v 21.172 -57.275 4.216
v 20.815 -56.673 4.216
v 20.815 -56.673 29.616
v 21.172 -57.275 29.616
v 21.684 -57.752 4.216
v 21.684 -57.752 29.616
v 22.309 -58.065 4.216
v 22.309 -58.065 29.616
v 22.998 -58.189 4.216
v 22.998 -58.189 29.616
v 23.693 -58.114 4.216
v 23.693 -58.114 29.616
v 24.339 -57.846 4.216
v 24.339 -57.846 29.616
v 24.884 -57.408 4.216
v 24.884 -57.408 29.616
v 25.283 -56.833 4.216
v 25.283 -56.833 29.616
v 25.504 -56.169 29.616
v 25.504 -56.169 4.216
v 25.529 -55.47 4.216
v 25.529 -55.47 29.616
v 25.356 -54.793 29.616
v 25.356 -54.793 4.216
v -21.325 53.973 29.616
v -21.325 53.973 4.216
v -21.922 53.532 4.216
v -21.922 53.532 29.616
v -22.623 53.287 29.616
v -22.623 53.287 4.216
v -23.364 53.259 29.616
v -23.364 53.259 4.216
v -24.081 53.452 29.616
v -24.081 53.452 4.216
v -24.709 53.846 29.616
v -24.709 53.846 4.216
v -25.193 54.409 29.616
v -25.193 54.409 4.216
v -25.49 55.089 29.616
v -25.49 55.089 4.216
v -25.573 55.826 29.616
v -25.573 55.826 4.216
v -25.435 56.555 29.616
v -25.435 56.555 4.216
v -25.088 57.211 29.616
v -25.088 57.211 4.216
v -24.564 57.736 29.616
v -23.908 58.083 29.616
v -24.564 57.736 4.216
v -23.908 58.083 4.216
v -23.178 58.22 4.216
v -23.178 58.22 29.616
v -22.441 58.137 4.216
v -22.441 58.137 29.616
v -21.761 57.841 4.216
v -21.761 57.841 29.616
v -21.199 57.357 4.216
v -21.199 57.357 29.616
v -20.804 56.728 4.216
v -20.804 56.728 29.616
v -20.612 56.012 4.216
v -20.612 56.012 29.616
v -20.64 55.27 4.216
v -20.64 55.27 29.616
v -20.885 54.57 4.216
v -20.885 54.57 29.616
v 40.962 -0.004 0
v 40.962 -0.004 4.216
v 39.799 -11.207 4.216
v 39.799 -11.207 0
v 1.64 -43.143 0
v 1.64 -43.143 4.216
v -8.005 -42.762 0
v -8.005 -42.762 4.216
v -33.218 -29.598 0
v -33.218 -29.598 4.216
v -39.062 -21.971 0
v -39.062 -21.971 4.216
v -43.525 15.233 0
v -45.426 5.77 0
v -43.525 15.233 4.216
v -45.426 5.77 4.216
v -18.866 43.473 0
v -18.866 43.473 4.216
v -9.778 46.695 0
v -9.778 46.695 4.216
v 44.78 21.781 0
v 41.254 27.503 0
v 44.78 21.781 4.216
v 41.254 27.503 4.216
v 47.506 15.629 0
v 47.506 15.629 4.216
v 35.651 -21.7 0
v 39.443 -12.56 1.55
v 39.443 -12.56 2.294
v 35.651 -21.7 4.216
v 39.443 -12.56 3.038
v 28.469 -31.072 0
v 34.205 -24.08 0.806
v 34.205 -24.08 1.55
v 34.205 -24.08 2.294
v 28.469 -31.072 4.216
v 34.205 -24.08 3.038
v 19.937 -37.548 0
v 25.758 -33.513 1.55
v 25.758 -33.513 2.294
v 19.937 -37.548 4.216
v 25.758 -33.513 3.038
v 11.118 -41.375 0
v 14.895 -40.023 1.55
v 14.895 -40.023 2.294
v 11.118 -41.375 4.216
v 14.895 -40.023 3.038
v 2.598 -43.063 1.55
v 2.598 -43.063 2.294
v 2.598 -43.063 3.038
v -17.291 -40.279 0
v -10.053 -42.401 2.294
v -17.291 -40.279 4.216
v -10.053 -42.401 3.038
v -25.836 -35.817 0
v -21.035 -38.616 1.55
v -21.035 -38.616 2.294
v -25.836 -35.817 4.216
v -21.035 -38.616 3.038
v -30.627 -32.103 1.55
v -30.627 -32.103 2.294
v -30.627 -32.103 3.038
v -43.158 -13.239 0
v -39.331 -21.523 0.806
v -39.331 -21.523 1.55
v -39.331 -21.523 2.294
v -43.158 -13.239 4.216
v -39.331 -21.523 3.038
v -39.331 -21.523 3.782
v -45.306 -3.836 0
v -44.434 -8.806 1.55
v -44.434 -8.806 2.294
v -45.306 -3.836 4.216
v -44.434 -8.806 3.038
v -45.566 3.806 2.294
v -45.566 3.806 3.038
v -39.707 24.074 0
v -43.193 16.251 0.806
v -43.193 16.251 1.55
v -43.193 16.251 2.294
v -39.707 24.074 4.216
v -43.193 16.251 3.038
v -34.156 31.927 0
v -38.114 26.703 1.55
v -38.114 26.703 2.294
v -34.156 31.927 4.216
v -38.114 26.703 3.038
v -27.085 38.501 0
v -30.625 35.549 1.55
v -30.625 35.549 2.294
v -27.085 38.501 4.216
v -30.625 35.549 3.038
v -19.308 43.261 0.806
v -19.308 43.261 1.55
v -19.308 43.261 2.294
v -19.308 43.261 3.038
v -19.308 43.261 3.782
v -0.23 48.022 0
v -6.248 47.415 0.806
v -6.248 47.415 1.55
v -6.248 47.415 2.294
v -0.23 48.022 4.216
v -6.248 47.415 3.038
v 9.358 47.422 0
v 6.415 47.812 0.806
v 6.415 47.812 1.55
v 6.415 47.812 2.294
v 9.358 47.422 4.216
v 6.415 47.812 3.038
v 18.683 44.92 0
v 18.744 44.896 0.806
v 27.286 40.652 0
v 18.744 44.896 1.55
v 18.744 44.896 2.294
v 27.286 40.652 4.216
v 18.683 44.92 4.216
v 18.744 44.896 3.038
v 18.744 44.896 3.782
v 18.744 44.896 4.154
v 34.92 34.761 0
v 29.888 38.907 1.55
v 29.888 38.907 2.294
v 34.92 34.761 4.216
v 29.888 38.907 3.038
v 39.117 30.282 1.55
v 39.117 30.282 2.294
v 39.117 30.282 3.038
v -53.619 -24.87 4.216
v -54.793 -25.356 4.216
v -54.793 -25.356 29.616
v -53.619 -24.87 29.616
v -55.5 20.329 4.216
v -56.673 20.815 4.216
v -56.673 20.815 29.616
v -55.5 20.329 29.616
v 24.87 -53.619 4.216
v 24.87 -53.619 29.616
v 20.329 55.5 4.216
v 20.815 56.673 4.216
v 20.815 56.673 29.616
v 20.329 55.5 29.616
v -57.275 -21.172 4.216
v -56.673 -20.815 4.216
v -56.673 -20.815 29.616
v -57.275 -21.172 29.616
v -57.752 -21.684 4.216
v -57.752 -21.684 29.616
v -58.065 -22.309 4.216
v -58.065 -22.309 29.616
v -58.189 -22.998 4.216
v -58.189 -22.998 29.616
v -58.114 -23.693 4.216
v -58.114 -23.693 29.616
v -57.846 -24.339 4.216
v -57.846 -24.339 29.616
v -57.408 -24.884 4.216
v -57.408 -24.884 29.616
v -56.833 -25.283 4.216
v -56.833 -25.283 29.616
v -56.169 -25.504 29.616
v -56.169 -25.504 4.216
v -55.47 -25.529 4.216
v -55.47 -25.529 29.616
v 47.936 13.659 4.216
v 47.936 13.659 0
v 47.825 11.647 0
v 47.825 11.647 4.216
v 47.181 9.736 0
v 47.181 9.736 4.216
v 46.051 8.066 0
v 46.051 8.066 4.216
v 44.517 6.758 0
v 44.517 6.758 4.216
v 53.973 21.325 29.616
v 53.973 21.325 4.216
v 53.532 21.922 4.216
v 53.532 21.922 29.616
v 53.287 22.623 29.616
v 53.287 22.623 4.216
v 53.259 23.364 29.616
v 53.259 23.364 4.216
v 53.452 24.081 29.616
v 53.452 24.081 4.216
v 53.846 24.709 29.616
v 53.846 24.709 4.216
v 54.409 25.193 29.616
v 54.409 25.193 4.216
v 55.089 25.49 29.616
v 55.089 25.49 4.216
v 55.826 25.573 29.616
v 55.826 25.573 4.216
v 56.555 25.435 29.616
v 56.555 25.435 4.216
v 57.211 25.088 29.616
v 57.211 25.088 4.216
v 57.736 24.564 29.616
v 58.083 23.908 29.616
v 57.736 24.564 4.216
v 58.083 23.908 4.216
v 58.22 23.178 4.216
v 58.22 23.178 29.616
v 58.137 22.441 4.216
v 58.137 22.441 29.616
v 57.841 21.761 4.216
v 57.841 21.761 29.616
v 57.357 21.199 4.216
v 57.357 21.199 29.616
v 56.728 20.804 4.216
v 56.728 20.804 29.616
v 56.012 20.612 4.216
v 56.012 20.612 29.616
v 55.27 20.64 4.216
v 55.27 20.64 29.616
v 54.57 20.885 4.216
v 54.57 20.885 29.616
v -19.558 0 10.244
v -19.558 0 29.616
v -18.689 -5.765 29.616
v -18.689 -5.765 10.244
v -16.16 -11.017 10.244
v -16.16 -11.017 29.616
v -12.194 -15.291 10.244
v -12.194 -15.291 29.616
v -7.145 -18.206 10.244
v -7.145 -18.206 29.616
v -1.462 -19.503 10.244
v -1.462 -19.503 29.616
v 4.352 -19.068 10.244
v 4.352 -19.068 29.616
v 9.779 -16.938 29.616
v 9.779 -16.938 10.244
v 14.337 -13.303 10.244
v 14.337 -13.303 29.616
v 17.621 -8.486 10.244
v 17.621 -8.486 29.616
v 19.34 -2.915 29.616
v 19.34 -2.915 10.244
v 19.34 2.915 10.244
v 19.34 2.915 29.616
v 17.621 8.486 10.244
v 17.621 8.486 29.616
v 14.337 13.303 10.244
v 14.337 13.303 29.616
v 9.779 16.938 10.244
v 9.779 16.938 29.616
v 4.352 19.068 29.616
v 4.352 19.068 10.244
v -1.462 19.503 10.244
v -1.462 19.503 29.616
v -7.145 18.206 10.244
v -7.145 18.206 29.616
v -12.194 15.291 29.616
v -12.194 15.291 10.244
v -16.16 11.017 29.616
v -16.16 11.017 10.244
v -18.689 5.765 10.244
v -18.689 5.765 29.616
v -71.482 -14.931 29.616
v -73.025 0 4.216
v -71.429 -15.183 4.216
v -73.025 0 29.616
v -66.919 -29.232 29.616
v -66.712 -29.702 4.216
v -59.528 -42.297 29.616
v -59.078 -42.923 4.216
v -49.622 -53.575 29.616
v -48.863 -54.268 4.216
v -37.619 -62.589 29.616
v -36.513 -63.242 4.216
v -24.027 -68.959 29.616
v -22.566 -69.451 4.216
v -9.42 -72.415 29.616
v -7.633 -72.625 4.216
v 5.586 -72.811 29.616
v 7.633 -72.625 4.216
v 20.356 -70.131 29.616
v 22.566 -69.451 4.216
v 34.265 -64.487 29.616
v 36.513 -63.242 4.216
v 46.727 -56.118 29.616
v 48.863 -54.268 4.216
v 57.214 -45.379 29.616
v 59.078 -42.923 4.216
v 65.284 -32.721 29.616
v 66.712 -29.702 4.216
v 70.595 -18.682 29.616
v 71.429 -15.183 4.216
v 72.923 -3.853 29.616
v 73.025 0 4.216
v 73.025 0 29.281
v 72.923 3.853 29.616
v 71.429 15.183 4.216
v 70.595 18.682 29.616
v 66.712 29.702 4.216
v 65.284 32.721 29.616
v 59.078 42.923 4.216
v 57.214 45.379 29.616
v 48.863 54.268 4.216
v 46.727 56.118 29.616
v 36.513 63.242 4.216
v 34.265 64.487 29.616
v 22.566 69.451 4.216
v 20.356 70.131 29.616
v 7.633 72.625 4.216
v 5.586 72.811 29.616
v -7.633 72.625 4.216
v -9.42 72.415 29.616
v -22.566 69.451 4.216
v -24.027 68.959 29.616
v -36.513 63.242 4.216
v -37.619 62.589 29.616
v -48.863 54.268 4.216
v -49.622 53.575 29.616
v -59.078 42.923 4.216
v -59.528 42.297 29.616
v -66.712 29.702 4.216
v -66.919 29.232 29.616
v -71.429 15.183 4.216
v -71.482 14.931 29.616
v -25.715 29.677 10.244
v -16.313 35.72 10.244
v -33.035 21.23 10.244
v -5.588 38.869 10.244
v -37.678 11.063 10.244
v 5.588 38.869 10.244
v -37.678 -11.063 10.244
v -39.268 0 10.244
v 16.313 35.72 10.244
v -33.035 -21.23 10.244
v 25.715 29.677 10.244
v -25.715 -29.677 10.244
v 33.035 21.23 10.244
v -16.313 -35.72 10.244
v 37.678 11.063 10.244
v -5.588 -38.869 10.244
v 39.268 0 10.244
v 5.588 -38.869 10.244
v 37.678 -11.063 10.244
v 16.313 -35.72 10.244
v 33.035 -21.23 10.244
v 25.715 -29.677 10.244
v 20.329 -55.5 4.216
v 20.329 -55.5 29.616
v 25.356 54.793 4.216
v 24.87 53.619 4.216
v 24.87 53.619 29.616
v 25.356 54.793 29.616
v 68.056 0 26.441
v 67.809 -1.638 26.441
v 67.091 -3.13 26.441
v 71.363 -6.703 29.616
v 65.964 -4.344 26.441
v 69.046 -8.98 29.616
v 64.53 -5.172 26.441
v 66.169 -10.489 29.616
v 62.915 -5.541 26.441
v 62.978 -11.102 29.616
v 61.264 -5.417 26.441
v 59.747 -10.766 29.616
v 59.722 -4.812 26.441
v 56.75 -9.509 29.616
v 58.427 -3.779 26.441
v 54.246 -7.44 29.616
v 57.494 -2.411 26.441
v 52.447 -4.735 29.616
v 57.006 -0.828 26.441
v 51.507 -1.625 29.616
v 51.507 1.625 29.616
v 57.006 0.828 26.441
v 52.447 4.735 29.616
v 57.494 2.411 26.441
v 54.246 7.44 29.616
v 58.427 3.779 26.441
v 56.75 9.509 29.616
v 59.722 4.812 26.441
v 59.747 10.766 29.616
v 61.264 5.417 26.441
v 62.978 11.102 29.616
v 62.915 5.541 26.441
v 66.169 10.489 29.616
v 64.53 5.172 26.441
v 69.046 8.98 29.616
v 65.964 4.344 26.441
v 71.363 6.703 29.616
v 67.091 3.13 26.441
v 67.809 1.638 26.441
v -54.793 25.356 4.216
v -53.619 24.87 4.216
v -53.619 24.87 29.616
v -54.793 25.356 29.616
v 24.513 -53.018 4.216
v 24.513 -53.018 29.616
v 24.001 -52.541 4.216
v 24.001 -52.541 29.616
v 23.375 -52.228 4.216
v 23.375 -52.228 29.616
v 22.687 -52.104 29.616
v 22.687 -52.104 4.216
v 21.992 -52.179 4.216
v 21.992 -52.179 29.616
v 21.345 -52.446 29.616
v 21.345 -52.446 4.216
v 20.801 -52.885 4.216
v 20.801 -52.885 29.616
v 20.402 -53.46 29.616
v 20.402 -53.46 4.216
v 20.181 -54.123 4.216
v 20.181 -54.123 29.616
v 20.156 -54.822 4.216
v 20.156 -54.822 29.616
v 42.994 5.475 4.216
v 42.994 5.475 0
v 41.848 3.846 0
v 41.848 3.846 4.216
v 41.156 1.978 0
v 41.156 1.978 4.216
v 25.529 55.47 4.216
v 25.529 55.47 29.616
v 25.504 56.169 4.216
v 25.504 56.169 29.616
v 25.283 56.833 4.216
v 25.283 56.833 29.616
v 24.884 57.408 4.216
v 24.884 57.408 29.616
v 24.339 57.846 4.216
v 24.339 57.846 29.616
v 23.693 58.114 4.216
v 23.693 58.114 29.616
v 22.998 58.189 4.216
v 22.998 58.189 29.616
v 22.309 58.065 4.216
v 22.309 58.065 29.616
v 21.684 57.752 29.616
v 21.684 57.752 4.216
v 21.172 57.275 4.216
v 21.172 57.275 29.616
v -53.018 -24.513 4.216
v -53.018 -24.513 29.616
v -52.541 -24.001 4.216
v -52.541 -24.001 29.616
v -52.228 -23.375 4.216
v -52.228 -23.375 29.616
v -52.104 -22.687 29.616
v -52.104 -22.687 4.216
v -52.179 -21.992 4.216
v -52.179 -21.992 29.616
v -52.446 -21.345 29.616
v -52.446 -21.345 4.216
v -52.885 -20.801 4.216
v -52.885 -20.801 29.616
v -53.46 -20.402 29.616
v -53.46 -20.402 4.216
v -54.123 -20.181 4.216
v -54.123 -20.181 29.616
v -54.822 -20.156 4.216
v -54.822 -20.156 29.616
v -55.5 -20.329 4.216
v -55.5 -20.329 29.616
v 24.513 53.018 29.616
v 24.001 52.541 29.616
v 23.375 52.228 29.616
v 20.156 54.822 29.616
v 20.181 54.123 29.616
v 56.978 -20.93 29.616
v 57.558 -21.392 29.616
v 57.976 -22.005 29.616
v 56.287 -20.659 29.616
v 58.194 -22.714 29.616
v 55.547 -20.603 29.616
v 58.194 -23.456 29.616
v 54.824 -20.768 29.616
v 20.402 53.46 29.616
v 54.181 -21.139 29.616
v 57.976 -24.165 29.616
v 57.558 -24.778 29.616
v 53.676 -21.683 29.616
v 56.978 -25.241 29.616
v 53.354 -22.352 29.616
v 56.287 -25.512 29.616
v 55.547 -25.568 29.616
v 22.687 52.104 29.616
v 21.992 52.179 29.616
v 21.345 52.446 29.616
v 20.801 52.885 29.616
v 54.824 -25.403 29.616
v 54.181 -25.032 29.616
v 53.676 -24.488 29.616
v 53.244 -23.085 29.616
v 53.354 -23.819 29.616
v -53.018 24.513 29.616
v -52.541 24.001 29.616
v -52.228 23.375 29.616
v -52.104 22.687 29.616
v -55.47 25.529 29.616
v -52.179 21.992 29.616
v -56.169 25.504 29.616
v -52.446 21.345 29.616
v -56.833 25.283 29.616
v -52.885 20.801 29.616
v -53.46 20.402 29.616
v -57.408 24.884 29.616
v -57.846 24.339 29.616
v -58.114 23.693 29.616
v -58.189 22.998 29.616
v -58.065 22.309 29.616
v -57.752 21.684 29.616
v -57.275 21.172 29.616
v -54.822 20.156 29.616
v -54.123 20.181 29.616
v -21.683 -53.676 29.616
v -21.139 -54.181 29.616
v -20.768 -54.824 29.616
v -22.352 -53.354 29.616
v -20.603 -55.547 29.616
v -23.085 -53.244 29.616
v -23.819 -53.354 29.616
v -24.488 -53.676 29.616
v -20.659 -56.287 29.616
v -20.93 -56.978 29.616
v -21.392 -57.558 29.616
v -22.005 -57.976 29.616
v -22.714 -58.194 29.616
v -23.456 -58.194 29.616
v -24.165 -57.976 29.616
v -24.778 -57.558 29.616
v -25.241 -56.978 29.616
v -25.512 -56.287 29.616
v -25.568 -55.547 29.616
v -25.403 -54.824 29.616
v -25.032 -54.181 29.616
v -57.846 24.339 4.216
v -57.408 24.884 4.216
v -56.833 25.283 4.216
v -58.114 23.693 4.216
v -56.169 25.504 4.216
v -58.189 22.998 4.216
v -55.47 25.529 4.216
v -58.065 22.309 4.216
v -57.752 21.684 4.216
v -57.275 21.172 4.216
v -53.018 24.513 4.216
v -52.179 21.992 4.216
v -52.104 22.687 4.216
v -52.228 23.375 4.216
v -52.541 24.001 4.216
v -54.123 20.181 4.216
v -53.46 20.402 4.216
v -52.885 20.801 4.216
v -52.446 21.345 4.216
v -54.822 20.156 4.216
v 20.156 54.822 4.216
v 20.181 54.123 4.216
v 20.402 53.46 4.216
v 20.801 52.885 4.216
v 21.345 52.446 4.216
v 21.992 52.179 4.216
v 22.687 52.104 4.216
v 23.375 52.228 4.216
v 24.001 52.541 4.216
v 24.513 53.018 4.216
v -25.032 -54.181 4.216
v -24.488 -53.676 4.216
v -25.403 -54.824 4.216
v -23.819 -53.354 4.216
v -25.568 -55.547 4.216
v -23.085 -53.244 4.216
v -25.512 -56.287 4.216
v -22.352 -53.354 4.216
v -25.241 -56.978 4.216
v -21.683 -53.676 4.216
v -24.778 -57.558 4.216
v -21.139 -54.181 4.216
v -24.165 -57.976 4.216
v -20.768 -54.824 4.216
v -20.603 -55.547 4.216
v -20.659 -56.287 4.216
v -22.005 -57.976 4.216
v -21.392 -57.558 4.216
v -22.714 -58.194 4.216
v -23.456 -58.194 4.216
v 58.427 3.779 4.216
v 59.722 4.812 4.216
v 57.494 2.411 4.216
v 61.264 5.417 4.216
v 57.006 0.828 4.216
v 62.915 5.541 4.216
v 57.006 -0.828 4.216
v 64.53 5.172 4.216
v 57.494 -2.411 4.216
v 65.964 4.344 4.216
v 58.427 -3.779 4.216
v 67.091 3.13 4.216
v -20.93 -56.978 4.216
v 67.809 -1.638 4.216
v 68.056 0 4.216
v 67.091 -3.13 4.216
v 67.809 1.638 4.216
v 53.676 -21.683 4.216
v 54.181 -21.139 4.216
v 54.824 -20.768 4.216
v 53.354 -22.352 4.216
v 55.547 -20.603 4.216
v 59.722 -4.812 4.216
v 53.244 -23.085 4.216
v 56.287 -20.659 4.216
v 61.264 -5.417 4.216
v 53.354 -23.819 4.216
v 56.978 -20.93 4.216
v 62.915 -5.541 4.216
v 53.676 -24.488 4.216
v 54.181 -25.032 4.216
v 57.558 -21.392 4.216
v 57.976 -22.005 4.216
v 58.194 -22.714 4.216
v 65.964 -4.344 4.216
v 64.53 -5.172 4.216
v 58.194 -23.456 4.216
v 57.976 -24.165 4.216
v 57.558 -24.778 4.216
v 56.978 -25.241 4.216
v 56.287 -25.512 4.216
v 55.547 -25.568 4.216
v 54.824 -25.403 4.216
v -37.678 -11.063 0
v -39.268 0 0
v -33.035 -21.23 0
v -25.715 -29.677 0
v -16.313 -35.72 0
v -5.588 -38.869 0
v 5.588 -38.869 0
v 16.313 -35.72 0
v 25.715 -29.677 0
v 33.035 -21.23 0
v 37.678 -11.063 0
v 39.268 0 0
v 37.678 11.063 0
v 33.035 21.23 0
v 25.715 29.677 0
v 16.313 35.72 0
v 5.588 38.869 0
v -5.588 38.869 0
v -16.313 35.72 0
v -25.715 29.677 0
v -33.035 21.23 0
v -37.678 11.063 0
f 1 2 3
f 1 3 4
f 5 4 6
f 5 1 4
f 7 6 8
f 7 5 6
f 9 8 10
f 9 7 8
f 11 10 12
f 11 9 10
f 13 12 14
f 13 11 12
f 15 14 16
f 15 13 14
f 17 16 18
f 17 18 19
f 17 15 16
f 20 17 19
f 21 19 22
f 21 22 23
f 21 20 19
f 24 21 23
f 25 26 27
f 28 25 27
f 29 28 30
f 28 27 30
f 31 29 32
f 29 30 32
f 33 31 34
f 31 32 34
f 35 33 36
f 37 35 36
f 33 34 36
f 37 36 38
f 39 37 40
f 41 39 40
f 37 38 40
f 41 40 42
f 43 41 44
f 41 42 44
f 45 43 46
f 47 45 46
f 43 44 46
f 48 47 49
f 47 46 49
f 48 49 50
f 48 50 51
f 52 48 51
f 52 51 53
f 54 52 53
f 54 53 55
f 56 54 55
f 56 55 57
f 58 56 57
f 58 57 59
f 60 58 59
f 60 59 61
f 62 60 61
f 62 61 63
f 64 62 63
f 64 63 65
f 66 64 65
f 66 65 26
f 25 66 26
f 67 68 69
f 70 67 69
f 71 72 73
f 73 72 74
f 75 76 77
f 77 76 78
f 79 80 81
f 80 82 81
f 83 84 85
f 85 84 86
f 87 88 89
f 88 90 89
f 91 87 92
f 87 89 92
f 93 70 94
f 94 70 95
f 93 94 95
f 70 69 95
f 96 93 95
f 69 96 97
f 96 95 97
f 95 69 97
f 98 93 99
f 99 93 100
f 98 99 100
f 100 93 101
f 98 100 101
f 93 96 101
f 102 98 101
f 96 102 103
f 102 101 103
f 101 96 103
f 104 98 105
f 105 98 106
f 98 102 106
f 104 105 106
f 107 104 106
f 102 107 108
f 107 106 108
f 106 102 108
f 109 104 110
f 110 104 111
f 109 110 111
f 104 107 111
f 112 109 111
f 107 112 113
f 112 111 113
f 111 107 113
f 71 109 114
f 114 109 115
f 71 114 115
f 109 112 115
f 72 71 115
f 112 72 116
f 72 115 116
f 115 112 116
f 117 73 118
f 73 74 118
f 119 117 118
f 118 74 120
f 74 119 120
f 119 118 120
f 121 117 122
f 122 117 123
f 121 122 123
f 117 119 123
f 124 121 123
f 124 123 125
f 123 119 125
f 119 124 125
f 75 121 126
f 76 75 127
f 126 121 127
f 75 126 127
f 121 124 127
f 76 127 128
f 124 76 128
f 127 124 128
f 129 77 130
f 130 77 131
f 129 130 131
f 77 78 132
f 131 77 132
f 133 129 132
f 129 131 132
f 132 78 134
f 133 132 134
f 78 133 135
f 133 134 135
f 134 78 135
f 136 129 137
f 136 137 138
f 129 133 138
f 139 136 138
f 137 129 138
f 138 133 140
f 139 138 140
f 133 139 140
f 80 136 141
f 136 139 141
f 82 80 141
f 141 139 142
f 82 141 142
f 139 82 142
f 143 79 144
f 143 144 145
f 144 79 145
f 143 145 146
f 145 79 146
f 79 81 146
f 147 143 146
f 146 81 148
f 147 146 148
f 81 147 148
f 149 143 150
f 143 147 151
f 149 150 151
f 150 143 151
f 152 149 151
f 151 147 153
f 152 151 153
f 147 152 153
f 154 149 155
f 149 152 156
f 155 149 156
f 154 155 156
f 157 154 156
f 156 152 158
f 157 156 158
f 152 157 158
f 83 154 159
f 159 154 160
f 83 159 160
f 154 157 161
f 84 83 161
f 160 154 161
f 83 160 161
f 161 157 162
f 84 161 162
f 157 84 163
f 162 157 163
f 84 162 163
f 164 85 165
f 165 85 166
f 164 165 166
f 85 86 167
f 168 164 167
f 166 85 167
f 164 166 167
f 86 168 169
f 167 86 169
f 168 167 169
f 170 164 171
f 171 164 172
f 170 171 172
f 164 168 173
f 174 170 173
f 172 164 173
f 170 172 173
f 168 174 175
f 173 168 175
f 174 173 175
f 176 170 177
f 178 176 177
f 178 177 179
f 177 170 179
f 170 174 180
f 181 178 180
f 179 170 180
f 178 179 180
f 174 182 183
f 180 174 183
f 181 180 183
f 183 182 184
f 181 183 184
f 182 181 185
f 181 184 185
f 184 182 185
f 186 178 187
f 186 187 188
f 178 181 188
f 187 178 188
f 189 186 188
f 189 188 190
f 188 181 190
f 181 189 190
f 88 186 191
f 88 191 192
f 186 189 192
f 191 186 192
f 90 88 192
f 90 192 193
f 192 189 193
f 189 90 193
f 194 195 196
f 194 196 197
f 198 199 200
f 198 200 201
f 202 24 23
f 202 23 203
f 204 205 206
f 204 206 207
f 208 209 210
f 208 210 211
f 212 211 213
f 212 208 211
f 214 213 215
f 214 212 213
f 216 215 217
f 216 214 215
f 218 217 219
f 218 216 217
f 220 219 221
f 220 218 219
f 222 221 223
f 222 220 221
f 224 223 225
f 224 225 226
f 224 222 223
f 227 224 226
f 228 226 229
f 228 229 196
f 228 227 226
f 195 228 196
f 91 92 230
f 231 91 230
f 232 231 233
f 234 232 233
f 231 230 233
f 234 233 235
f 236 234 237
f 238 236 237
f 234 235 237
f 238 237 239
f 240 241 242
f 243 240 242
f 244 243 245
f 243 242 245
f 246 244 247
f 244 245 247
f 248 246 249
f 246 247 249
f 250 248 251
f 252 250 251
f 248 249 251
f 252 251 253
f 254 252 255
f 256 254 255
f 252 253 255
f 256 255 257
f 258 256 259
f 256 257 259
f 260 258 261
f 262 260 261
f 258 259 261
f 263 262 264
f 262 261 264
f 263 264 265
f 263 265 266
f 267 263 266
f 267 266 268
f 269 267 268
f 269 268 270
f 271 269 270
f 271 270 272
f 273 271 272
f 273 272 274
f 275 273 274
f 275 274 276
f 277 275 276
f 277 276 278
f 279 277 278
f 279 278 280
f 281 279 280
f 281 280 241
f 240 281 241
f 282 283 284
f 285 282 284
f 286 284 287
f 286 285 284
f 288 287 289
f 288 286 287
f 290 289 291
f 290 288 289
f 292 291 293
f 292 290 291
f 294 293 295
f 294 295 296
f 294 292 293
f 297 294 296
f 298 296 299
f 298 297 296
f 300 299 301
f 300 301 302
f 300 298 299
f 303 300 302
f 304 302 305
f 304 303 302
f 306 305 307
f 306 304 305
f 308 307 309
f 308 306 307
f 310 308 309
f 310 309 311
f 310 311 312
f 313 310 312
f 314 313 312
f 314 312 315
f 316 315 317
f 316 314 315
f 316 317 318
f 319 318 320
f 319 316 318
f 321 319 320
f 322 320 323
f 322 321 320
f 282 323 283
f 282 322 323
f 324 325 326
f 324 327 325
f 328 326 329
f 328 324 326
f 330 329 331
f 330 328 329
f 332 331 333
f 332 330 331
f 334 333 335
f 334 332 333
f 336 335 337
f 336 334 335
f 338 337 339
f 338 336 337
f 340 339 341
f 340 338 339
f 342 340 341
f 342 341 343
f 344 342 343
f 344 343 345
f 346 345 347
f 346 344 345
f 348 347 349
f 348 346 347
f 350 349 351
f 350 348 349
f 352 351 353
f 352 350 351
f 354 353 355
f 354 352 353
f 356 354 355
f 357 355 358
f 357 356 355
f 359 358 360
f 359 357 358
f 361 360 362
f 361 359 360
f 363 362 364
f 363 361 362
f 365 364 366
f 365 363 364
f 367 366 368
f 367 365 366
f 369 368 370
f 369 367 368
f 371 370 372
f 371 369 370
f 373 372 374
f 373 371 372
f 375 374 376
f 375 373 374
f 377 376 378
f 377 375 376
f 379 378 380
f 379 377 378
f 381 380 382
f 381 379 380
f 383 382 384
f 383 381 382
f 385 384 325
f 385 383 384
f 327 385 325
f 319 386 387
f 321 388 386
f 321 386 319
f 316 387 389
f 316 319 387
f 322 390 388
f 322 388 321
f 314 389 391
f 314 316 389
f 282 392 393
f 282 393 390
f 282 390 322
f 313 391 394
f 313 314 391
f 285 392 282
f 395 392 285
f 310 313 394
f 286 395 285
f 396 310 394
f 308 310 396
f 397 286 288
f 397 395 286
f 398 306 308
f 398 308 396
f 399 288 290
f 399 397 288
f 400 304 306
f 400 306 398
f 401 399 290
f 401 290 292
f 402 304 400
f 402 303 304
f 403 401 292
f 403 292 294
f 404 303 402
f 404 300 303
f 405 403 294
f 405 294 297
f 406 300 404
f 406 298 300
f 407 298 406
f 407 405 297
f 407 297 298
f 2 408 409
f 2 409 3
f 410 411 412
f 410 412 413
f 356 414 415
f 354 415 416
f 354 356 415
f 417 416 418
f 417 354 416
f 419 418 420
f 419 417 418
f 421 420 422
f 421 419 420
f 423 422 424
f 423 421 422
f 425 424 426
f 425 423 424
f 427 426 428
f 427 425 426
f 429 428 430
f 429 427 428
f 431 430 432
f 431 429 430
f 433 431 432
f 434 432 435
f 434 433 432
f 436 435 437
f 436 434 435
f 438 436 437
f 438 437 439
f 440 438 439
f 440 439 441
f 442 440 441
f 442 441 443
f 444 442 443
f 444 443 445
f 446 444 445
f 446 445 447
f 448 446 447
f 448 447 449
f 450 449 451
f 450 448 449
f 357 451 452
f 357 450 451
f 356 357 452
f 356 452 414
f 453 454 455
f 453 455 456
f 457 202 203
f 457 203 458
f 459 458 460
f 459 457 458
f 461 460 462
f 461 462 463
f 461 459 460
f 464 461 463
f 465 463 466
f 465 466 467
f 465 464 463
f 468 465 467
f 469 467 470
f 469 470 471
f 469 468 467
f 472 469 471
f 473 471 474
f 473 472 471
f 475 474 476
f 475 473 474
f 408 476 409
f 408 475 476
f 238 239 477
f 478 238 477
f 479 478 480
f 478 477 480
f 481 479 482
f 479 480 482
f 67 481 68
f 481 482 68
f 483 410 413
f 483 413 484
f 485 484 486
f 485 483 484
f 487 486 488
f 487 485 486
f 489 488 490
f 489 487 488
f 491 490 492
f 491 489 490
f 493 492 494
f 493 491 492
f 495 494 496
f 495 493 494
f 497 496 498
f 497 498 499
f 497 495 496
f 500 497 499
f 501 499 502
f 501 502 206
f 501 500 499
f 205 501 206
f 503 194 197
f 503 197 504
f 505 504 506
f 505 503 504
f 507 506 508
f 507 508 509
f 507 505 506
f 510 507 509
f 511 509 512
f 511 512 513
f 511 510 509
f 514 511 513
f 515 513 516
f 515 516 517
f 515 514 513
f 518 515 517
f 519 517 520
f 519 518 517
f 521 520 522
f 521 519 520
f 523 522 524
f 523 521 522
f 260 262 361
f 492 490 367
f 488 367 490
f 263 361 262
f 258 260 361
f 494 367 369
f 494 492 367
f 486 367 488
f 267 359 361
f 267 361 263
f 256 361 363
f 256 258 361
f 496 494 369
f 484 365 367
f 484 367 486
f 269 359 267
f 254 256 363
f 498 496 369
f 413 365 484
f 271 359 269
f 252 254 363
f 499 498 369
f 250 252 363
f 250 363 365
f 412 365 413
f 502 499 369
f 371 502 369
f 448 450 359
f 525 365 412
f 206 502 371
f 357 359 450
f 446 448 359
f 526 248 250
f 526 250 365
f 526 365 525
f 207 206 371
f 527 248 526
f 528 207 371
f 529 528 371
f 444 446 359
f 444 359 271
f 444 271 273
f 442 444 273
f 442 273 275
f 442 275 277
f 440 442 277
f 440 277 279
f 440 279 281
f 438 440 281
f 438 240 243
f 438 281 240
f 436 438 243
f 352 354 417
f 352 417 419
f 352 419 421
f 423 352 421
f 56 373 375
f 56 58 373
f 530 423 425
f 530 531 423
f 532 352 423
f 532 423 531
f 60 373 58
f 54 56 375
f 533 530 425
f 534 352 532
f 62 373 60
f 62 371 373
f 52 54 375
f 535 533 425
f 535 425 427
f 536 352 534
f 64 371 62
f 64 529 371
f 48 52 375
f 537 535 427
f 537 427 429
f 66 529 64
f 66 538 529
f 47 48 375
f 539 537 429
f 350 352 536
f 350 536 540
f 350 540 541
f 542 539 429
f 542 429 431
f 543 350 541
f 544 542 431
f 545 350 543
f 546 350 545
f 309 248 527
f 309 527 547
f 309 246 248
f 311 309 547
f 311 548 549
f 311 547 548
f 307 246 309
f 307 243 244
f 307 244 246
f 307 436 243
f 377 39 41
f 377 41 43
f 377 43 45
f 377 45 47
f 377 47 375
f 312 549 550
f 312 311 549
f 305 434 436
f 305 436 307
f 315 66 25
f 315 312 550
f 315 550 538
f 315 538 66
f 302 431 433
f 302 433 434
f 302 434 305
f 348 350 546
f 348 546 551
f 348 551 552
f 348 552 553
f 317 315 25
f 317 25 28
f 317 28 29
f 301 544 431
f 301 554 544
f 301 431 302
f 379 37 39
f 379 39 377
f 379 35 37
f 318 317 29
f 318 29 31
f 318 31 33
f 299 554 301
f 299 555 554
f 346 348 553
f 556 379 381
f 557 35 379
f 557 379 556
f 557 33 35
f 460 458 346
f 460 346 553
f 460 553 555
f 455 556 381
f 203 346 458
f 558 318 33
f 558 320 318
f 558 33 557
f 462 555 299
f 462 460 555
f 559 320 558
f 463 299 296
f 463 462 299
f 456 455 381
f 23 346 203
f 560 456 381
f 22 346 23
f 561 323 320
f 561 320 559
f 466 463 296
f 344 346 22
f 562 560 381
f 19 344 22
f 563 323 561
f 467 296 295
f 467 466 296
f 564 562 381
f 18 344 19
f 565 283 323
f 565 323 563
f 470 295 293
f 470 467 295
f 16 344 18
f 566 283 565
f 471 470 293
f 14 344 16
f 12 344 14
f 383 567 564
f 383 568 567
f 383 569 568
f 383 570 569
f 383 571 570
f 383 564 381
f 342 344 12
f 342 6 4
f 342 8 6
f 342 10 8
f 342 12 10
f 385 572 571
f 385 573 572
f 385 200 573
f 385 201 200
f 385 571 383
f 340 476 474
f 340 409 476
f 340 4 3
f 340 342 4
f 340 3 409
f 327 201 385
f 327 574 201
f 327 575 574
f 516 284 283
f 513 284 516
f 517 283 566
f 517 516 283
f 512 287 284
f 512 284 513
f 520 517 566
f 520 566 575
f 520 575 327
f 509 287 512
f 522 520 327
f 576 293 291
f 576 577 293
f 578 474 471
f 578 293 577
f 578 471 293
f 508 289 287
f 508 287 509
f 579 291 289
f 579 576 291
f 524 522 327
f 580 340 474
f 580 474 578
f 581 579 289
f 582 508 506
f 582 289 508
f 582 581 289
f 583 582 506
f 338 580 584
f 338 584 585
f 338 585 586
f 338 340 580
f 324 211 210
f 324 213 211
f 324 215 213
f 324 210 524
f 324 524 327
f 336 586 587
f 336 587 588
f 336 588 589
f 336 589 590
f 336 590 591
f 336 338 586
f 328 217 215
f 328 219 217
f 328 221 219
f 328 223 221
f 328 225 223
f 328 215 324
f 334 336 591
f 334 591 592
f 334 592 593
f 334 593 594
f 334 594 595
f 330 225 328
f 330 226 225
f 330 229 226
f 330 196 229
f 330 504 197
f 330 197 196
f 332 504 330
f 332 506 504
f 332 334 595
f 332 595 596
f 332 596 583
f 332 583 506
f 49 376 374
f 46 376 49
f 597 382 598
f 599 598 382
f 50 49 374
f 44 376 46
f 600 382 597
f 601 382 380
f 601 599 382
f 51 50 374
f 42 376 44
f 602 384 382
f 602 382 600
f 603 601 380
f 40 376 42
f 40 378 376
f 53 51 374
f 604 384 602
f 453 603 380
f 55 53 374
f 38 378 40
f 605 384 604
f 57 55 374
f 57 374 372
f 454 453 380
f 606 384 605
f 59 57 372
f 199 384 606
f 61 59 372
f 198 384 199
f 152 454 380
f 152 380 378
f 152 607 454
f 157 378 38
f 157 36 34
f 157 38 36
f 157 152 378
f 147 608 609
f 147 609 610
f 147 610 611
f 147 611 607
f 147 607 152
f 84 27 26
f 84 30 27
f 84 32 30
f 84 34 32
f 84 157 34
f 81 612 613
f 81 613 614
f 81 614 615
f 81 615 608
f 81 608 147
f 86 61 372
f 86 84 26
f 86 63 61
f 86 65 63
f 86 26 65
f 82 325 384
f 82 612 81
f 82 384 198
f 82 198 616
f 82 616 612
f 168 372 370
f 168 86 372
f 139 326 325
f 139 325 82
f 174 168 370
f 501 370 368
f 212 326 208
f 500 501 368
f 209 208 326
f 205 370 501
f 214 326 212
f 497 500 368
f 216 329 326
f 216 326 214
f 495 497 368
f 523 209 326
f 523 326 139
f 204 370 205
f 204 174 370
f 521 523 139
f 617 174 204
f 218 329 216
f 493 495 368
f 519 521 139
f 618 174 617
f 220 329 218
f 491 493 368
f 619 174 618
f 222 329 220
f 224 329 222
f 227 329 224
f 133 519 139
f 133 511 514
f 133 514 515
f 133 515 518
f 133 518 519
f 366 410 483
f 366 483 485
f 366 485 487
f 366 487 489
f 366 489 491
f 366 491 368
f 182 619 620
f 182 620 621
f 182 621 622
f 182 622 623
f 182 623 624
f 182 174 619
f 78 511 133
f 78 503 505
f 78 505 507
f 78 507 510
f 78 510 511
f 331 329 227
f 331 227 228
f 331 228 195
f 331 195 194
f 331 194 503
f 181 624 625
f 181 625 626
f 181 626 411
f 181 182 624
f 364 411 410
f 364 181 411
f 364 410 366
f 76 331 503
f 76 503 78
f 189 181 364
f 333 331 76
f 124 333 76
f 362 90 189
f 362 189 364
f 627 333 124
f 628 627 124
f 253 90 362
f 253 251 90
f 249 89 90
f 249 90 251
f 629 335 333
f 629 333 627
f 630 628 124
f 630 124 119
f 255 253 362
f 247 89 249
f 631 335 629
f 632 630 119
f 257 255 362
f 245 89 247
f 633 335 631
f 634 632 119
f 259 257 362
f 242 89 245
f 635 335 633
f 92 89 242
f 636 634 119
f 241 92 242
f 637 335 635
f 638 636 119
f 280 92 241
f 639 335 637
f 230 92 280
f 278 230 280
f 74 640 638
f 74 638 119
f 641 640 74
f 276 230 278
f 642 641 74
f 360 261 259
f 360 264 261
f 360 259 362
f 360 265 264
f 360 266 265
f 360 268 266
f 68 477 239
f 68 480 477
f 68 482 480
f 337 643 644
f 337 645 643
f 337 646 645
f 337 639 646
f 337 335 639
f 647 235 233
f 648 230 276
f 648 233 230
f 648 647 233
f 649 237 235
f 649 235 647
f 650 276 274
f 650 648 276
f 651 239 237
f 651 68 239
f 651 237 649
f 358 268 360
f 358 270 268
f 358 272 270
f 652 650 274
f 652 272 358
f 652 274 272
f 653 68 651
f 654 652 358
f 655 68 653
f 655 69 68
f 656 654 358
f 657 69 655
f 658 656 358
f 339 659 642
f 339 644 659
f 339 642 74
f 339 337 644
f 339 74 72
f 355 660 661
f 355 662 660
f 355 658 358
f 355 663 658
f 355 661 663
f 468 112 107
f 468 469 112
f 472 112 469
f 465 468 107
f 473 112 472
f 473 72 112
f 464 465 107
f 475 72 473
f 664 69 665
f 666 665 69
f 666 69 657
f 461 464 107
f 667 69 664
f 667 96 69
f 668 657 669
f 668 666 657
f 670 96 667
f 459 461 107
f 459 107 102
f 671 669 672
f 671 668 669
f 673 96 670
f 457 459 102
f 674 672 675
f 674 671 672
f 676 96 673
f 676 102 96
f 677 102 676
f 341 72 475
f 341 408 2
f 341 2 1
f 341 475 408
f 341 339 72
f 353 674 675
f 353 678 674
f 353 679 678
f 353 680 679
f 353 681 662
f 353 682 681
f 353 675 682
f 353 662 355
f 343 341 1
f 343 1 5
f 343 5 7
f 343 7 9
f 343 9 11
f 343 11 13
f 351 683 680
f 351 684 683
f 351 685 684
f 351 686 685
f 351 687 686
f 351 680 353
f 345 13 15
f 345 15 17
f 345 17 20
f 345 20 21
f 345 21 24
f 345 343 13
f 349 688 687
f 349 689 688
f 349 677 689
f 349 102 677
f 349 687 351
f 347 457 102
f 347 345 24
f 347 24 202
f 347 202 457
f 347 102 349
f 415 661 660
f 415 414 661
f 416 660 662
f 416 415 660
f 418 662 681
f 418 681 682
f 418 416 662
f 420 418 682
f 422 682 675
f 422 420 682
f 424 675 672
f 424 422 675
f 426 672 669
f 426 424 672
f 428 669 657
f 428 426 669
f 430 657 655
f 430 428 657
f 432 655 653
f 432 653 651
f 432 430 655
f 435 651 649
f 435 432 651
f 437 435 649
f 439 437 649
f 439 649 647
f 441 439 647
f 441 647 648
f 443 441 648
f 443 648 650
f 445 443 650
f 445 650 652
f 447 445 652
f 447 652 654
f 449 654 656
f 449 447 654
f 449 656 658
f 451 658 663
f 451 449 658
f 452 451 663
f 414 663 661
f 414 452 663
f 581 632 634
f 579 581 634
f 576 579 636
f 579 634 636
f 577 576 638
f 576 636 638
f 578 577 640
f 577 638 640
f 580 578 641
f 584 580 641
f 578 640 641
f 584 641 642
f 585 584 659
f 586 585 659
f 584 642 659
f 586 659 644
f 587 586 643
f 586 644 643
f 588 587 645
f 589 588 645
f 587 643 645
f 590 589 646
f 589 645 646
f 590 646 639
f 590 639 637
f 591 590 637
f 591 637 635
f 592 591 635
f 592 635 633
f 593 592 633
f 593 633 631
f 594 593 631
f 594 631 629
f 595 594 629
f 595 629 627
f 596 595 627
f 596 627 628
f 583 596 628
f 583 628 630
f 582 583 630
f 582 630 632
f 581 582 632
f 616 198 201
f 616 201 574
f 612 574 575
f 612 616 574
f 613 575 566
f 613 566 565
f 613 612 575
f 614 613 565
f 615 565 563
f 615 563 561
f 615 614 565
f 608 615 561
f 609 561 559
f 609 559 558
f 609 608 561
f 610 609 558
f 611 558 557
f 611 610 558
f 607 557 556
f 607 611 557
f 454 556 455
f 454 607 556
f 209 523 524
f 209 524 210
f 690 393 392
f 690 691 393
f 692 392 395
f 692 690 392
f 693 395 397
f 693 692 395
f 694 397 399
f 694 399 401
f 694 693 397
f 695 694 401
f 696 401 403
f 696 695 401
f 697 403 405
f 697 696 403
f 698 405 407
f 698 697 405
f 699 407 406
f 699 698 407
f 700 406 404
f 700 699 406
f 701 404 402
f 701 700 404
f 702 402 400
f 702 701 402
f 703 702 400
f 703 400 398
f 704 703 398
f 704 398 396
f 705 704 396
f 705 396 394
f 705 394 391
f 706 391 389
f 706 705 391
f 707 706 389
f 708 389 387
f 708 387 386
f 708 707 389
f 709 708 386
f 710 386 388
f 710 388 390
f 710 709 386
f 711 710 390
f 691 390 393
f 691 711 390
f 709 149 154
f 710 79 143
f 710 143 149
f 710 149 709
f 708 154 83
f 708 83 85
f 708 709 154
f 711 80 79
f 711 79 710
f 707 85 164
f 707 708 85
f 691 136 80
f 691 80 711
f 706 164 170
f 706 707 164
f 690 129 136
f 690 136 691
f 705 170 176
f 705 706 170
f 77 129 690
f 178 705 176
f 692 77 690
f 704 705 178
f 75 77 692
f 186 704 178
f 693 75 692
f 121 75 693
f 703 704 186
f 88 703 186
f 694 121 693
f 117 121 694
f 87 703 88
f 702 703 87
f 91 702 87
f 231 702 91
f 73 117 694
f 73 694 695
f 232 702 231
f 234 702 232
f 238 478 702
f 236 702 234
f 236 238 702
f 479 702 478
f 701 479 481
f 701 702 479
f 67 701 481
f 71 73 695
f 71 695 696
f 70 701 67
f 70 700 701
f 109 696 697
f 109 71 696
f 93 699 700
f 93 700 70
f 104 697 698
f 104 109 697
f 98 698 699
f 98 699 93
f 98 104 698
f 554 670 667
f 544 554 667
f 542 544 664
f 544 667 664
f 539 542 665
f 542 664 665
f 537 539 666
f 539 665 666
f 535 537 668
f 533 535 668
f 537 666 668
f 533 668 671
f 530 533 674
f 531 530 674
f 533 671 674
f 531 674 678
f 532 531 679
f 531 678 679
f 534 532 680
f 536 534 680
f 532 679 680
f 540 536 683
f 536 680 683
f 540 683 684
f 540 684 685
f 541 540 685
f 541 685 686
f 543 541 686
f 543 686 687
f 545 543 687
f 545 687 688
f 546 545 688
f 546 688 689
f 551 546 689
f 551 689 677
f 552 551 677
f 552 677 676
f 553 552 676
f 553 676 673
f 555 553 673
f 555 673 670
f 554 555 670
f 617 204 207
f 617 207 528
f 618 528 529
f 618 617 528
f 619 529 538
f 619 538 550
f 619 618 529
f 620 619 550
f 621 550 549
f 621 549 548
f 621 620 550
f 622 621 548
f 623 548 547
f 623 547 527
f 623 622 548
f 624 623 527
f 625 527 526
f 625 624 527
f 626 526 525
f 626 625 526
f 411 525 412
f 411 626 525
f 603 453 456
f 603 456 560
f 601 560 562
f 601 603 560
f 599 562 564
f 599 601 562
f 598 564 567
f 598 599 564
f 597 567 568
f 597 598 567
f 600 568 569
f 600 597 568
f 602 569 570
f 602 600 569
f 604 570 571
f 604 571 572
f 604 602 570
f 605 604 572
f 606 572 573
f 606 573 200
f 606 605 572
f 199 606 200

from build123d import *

# Parameters (mm, degrees)
CUT_EXTRUDE1_START               = 4.2164
SKETCH18_R                       = 57.15
CUT_EXTRUDE1_DEPTH               = 4.2164
F_10_CLEARANCE_HOLE1_D           = 4.9784
CIRPATTERN1_COUNT                = 8
CLEARANCING_START                = -4.2164
SKETCH32_R                       = 73.025
CLEARANCING_DEPTH                = 4.2164
F_10_START                       = 4.2164
F_10_0_1935_DIAMETER_SLOT1_DEPTH = 25.4
CIRPATTERN2_COUNT                = 8


# Read off the part's stored shape, not the designer's step: #10 (0.1935) Diameter Slot1
with BuildPart() as part:
    # Sketch25 → Revolve1 (revolve)
    with BuildSketch(Plane(origin=(0, 0, 0), x_dir=(1, 0, 0), z_dir=(0, 1, 0))):
        Polygon((-19.558, -29.6164), (-19.558, -10.24382), (-39.2684, -10.24382), (-39.2684, 0), (-57.15, 0), (-57.15, -4.2164), (-73.025, -4.2164), (-73.025, -29.6164), align=None)
    revolve(axis=Axis((0, 0, -8.4836), (0, 0, 1)))

    # Sketch18 → Cut-Extrude1 (cut)
    with BuildSketch(Plane.XY.offset(CUT_EXTRUDE1_START)):
        Circle(SKETCH18_R)
        with BuildLine():
            add(Edge.make_bspline(
                [(41.089237213, 0), (41.091962531, -0.086157587), (41.097413749, -0.258491166), (41.10355964, -0.517077072), (41.10820678, -0.775748178), (41.11421023, -1.293415642), (41.109015311, -2.589274196), (41.017814103, -4.490313926), (40.7831208, -6.729807087), (40.462314107, -8.787506492), (40.037808727, -10.829994254), (39.510298345, -12.852043551), (38.880746853, -14.848458078), (38.15038378, -16.814086746), (37.320701547, -18.743836999), (36.393451781, -20.63268838), (35.370641466, -22.475705706), (34.254528452, -24.268052099), (33.047616433, -26.005001751), (31.752649319, -27.681952446), (30.372605018, -29.294437787), (28.910688618, -30.83813911), (27.370324987, -32.308897058), (25.755150794, -33.702722776), (24.069005972, -35.015808715), (22.315924639, -36.244539), (20.500125495, -37.385499343), (18.62600172, -38.435486481), (16.698110388, -39.3915171), (14.721161433, -40.250836227), (12.700006186, -41.010925075), (10.639625512, -41.669508306), (8.545117571, -42.224560694), (6.421685244, -42.674313186), (4.274623243, -43.017258312), (2.109304944, -43.252154961), (-0.068831028, -43.378032487), (-2.254294428, -43.394194133), (-4.441557201, -43.300219785), (-6.625067428, -43.095968006), (-8.799263397, -42.781577389), (-10.958587737, -42.35746718), (-13.097501591, -41.8243372), (-15.210498799, -41.183167044), (-17.292120038, -40.435214565), (-19.336966901, -39.582013644), (-21.339715858, -38.62537124), (-23.295132091, -37.567363743), (-25.198083132, -36.410332623), (-27.043552306, -35.156879378), (-28.826651909, -33.809859817), (-30.542636113, -32.372377659), (-32.186913551, -30.847777489), (-33.75505955, -29.239637062), (-35.242827981, -27.551758997), (-36.6461627, -25.788161864), (-37.961208531, -23.953070684), (-39.184321792, -22.050906876), (-40.312080298, -20.086277666), (-41.34129285, -18.063964982), (-42.269008156, -15.988913871), (-43.092523175, -13.866220454), (-43.809390856, -11.701119456), (-44.417427247, -9.498971339), (-44.914717965, -7.265249075), (-45.299623986, -5.005524575), (-45.570786769, -2.725454833), (-45.727132667, -0.430767795), (-45.767876634, 1.872751999), (-45.692525205, 4.179277959), (-45.500878745, 6.482956161), (-45.193032951, 8.777920163), (-44.76937961, 11.058305925), (-44.2306066, 13.318266753), (-43.577697135, 15.551988265), (-42.811928261, 17.753703317), (-41.934868588, 19.917706858), (-40.948375273, 22.038370685), (-39.854590259, 24.110158043), (-38.655935769, 26.127638043), (-37.35510908, 28.085499861), (-35.95507656, 29.978566677), (-34.45906702, 31.801809315), (-32.870564351, 33.550359561), (-31.193299507, 35.2195231), (-29.431241811, 36.804792072), (-27.58858964, 38.301857174), (-25.669760482, 39.706619311), (-23.67938041, 41.015200739), (-21.62227298, 42.22395569), (-19.503447594, 43.329480427), (-17.328087349, 44.32862273), (-15.101536401, 45.218490759), (-12.829286876, 45.996461288), (-10.51696536, 46.660187279), (-8.170319005, 47.207604779), (-5.795201275, 47.63693911), (-3.397557376, 47.946710349), (-0.983409407, 48.13573807), (1.441158736, 48.203145338), (3.870016668, 48.148361942), (6.297002983, 47.971126851), (8.715940862, 47.671489899), (11.120653763, 47.249812672), (13.504981164, 46.706768607), (15.862794321, 46.043342297), (18.188011992, 45.260827993), (20.47461609, 44.360827321), (22.71666723, 43.345246195), (24.908320125, 42.216290953), (27.043838787, 40.976463712), (29.117611505, 39.628556947), (31.12416555, 38.175647316), (33.058181574, 36.621088743), (34.914507669, 34.968504765), (36.688173034, 33.221780166), (38.374401232, 31.385051924), (39.968622994, 29.462699478), (41.466488529, 27.459334348), (42.863879321, 25.37978913), (44.156919368, 23.229105887), (45.341985843, 21.012523976), (46.415719137, 18.735467323), (47.152873419, 16.943563677), (47.537044371, 15.914838228), (47.625380995, 15.672606956)],
                knots=[0, 0, 0, 0, 0.000898736, 0.001797664, 0.002696784, 0.003596095, 0.007195255, 0.016206602, 0.023429565, 0.030664921, 0.03791271, 0.04517297, 0.052445735, 0.059731037, 0.067028905, 0.074339368, 0.081662453, 0.088998186, 0.096346593, 0.103707696, 0.111081519, 0.118468084, 0.125867414, 0.13327953, 0.140704451, 0.148142199, 0.155592793, 0.163056252, 0.170532595, 0.178021841, 0.185524007, 0.193039111, 0.200567171, 0.208108204, 0.215662226, 0.223229255, 0.230809306, 0.238402396, 0.24600854, 0.253627754, 0.261260054, 0.268905454, 0.27656397, 0.284235617, 0.291920409, 0.29961836, 0.307329485, 0.315053798, 0.322791313, 0.330542044, 0.338306004, 0.346083208, 0.353873668, 0.361677398, 0.369494411, 0.37732472, 0.385168337, 0.393025277, 0.400895551, 0.408779172, 0.416676152, 0.424586504, 0.432510241, 0.440447374, 0.448397915, 0.456361877, 0.464339271, 0.472330109, 0.480334403, 0.488352164, 0.496383405, 0.504428136, 0.512486369, 0.520558115, 0.528643386, 0.536742193, 0.544854546, 0.552980457, 0.561119937, 0.569272997, 0.577439648, 0.585619899, 0.593813763, 0.60202125, 0.61024237, 0.618477134, 0.626725552, 0.634987634, 0.643263392, 0.651552835, 0.659855974, 0.668172818, 0.676503379, 0.684847665, 0.693205688, 0.701577457, 0.709962981, 0.718362272, 0.726775338, 0.73520219, 0.743642837, 0.752097289, 0.760565555, 0.769047646, 0.777543571, 0.786053339, 0.79457696, 0.803114443, 0.811665798, 0.820231034, 0.828810161, 0.837403187, 0.846010122, 0.854630975, 0.863265756, 0.871914473, 0.880577136, 0.889253753, 0.897944334, 0.906648887, 0.915367423, 0.924099948, 0.932846474, 0.941607007, 0.944295232, 0.944295232, 0.944295232, 0.944295232], degree=3))
            ThreePointArc((47.625380995, 15.672606956), (47.687720846, 10.629001226), (44.585991464, 6.651424093))
            ThreePointArc((44.585991464, 6.651424093), (41.960682048, 3.786728615), (41.089237213, 0))
        make_face(mode=Mode.SUBTRACT)
    extrude(amount=-CUT_EXTRUDE1_DEPTH, mode=Mode.SUBTRACT)

    # Sketch20 one side → Turbine Shaft Hole (revolve, cut)
    with BuildSketch(Plane(origin=(0, 0, 0), x_dir=(1, 0, 0), z_dir=(0, 1, 0)), mode=Mode.PRIVATE) as turbine_shaft_hole_sk:
        Polygon((56.94375, -26.4414), (51.3875, -29.6164), (62.5, -29.6164), (62.5, -4.2164), (56.94375, -4.2164), align=None)
    revolve(turbine_shaft_hole_sk.sketch.rotate(Axis((62.5, 0, 29.6164), (0, 0, -1)), 180), axis=Axis((62.5, 0, 29.6164), (0, 0, -1)), mode=Mode.SUBTRACT)

    # #10 Clearance Hole1 (through all)
    with Locations(Plane(origin=(55.733032799, -23.085378057, 29.6164), x_dir=(1, 0, 0), z_dir=(0, 0, 1))):
        with Locations((0, 0)):
            f_10_clearance_hole1 = Hole(F_10_CLEARANCE_HOLE1_D / 2)

    # CirPattern1: #10 Clearance Hole1 ×8 about axis, 4 skipped
    cirpattern1_axis = Axis((0, 0, 0), (0, 0, 1))
    add([f_10_clearance_hole1.rotate(cirpattern1_axis, i * 360 / CIRPATTERN1_COUNT) for i in range(1, CIRPATTERN1_COUNT) if i not in (2, 4, 5, 7)], mode=Mode.SUBTRACT)

    # Sketch32 → Clearancing (cut)
    with BuildSketch(Plane(origin=(0, 0, 0), x_dir=(-1, 0, 0), z_dir=(0, 0, -1)).offset(CLEARANCING_START)):
        Circle(SKETCH32_R)
        with BuildLine():
            ThreePointArc((-47.506067229, 15.629095748), (-47.567368082, 10.669550114), (-44.51733419, 6.758265932))
            ThreePointArc((-44.51733419, 6.758265932), (-41.848269617, 3.845825531), (-40.962300701, -0.004015228))
            add(Edge.make_bspline(
                [(-40.962300701, -0.004015228), (-40.984829754, -0.716243545), (-40.991482345, -1.426292399), (-40.965808515, -2.841039211), (-40.934791994, -3.545916987), (-40.788046598, -5.65317915), (-40.449416827, -8.44323574), (-39.826992242, -11.194334019), (-39.251228801, -13.242702158), (-39.04041264, -13.924921757), (-38.586043887, -15.271416492), (-38.342460818, -15.936244836), (-37.044241995, -19.219159068), (-35.751111298, -21.714802599), (-33.817948717, -24.671739224), (-33.415325439, -25.254916955), (-32.577512865, -26.404553153), (-32.142989691, -26.969901223), (-30.805310798, -28.622109954), (-29.863742521, -29.67138319), (-27.88370287, -31.668321975), (-26.84522274, -32.615978344), (-25.214580249, -33.961000268), (-24.658855428, -34.396572383), (-23.52273746, -35.241850655), (-22.941371199, -35.652200602), (-19.982337143, -37.630798215), (-17.495723306, -38.952149767), (-13.594391809, -40.558687212), (-12.265158452, -41.031133778), (-10.227142901, -41.643055288), (-9.538560062, -41.831284287), (-8.159344959, -42.171675018), (-7.468051402, -42.324142065), (-4.003321953, -42.999606071), (-1.205332292, -43.264420661), (2.324696242, -43.253266134), (3.032343885, -43.233770306), (4.450976737, -43.159684207), (5.16260658, -43.104918353), (7.279359647, -42.889714494), (8.673993393, -42.678265993), (12.809724164, -41.845880015), (15.503095197, -41.028729387), (18.787939685, -39.670706521), (19.439945622, -39.382349429), (20.721782261, -38.777972555), (21.353348612, -38.461258619), (23.220466367, -37.468277477), (25.636538884, -36.03026989), (27.907728904, -34.367230475), (29.556019298, -33.034366172), (30.096251631, -32.575792031), (31.157992098, -31.629561277), (31.678275818, -31.142874487), (34.206194586, -28.662350465), (36.015531715, -26.510793678), (38.41831625, -23.039245987), (39.16701973, -21.841083162), (40.20957198, -19.98066895), (40.543029676, -19.350876534), (41.176251076, -18.083381709), (41.476896624, -17.444132119), (42.901648241, -14.220838418), (43.792349276, -11.556354365), (44.594692676, -8.118555948), (44.739484647, -7.425593495), (44.997193357, -6.028683216), (45.110048425, -5.324423569), (45.397284161, -3.217220036), (45.521950193, -1.812522973), (45.701086012, 2.401261181), (45.562340657, 5.210043831), (45.059447785, 8.720503026), (44.941902272, 9.424175437), (44.675570213, 10.818485677), (44.526710242, 11.510176401), (44.03392467, 13.569160455), (43.253850892, 16.271636591), (42.232110927, 18.889968175), (41.374523909, 20.821933821), (41.073427004, 21.460617921), (40.440358133, 22.727235888), (40.107694699, 23.35639756), (38.373818129, 26.460390162), (36.780750271, 28.78088885), (34.095328382, 32.027965174), (33.150564893, 33.07112628), (31.657831232, 34.576159768), (31.147637834, 35.06787246), (30.101580295, 36.031020228), (29.567134533, 36.501054535), (26.856787595, 38.778313639), (24.550582917, 40.384325472), (20.890041552, 42.47849974), (19.636115903, 43.123761403), (17.703471684, 44.01067886), (17.048967242, 44.293434078), (15.733188711, 44.827093949), (15.071549163, 45.078271992), (11.744943292, 46.257335392), (9.025190072, 46.956566279), (4.859147554, 47.644767103), (3.455979938, 47.813706456), (1.328883106, 47.973856364), (0.6186853, 48.011419961), (-0.796199225, 48.054972454), (-1.502092621, 48.06105803), (-5.023934167, 48.014237149), (-7.817182412, 47.731371248), (-11.278596108, 47.072391218), (-11.96936046, 46.925213328), (-13.347812594, 46.599690607), (-14.03708102, 46.420880282), (-16.087853103, 45.84036778), (-17.428630402, 45.396086399), (-21.374271765, 43.89689302), (-23.903005899, 42.67684778), (-26.936352555, 40.875077272), (-27.536597899, 40.500788916), (-28.724048455, 39.723926887), (-29.311972723, 39.320747942), (-31.039486686, 38.080104884), (-32.148213344, 37.208324215), (-35.349169758, 34.462697204), (-37.317082683, 32.459509238), (-39.567440801, 29.737522075), (-40.006964214, 29.18215008), (-40.86456786, 28.049096194), (-41.281778161, 27.472452922), (-42.490525828, 25.724130807), (-43.242666913, 24.529670436), (-45.341238448, 20.861286589), (-46.530959758, 18.302975659), (-47.506067229, 15.629095748)],
                knots=[0, 0, 0, 0, 0.0078125, 0.0078125, 0.015625, 0.015625, 0.03125, 0.046875, 0.046875, 0.0546875, 0.0546875, 0.0625, 0.0625, 0.09375, 0.09375, 0.1015625, 0.1015625, 0.109375, 0.109375, 0.125, 0.125, 0.140625, 0.140625, 0.1484375, 0.1484375, 0.15625, 0.15625, 0.1875, 0.1875, 0.203125, 0.203125, 0.2109375, 0.2109375, 0.21875, 0.21875, 0.25, 0.25, 0.2578125, 0.2578125, 0.265625, 0.265625, 0.28125, 0.28125, 0.3125, 0.3125, 0.3203125, 0.3203125, 0.328125, 0.328125, 0.34375, 0.359375, 0.359375, 0.3671875, 0.3671875, 0.375, 0.375, 0.40625, 0.40625, 0.421875, 0.421875, 0.4296875, 0.4296875, 0.4375, 0.4375, 0.46875, 0.46875, 0.4765625, 0.4765625, 0.484375, 0.484375, 0.5, 0.5, 0.53125, 0.53125, 0.5390625, 0.5390625, 0.546875, 0.546875, 0.5625, 0.578125, 0.578125, 0.5859375, 0.5859375, 0.59375, 0.59375, 0.625, 0.625, 0.640625, 0.640625, 0.6484375, 0.6484375, 0.65625, 0.65625, 0.6875, 0.6875, 0.703125, 0.703125, 0.7109375, 0.7109375, 0.71875, 0.71875, 0.75, 0.75, 0.765625, 0.765625, 0.7734375, 0.7734375, 0.78125, 0.78125, 0.8125, 0.8125, 0.8203125, 0.8203125, 0.828125, 0.828125, 0.84375, 0.84375, 0.875, 0.875, 0.8828125, 0.8828125, 0.890625, 0.890625, 0.90625, 0.90625, 0.9375, 0.9375, 0.9453125, 0.9453125, 0.953125, 0.953125, 0.96875, 0.96875, 1, 1, 1, 1], degree=3))
        make_face(mode=Mode.SUBTRACT)
    extrude(amount=CLEARANCING_DEPTH, mode=Mode.SUBTRACT)

    # #10 (0.1935) Diameter Slot1 outline → #10 (0.1935) Diameter Slot1 (cut)
    with BuildSketch(Plane.XY.offset(F_10_START)):
        with BuildLine():
            ThreePointArc((20.8149903, -56.6734582), (24.025803458, -58.003420556), (25.355765815, -54.792607398))
            Line((25.355765815, -54.792607398), (24.869757855, -53.619280392))
            ThreePointArc((24.869757855, -53.619280392), (21.658944697, -52.289318035), (20.328982341, -55.500131193))
            Line((20.328982341, -55.500131193), (20.8149903, -56.6734582))
        make_face()
    f_10_0_1935_diameter_slot1 = extrude(amount=F_10_0_1935_DIAMETER_SLOT1_DEPTH, mode=Mode.SUBTRACT)

    # CirPattern2: #10 (0.1935) Diameter Slot1 ×8 about axis, 4 skipped
    cirpattern2_axis = Axis((0, 0, -50.361336866), (0, 0, 1))
    add([f_10_0_1935_diameter_slot1.rotate(cirpattern2_axis, i * 360 / CIRPATTERN2_COUNT) for i in range(1, CIRPATTERN2_COUNT) if i not in (1, 2, 4, 7)], mode=Mode.SUBTRACT)


solid = part.part
